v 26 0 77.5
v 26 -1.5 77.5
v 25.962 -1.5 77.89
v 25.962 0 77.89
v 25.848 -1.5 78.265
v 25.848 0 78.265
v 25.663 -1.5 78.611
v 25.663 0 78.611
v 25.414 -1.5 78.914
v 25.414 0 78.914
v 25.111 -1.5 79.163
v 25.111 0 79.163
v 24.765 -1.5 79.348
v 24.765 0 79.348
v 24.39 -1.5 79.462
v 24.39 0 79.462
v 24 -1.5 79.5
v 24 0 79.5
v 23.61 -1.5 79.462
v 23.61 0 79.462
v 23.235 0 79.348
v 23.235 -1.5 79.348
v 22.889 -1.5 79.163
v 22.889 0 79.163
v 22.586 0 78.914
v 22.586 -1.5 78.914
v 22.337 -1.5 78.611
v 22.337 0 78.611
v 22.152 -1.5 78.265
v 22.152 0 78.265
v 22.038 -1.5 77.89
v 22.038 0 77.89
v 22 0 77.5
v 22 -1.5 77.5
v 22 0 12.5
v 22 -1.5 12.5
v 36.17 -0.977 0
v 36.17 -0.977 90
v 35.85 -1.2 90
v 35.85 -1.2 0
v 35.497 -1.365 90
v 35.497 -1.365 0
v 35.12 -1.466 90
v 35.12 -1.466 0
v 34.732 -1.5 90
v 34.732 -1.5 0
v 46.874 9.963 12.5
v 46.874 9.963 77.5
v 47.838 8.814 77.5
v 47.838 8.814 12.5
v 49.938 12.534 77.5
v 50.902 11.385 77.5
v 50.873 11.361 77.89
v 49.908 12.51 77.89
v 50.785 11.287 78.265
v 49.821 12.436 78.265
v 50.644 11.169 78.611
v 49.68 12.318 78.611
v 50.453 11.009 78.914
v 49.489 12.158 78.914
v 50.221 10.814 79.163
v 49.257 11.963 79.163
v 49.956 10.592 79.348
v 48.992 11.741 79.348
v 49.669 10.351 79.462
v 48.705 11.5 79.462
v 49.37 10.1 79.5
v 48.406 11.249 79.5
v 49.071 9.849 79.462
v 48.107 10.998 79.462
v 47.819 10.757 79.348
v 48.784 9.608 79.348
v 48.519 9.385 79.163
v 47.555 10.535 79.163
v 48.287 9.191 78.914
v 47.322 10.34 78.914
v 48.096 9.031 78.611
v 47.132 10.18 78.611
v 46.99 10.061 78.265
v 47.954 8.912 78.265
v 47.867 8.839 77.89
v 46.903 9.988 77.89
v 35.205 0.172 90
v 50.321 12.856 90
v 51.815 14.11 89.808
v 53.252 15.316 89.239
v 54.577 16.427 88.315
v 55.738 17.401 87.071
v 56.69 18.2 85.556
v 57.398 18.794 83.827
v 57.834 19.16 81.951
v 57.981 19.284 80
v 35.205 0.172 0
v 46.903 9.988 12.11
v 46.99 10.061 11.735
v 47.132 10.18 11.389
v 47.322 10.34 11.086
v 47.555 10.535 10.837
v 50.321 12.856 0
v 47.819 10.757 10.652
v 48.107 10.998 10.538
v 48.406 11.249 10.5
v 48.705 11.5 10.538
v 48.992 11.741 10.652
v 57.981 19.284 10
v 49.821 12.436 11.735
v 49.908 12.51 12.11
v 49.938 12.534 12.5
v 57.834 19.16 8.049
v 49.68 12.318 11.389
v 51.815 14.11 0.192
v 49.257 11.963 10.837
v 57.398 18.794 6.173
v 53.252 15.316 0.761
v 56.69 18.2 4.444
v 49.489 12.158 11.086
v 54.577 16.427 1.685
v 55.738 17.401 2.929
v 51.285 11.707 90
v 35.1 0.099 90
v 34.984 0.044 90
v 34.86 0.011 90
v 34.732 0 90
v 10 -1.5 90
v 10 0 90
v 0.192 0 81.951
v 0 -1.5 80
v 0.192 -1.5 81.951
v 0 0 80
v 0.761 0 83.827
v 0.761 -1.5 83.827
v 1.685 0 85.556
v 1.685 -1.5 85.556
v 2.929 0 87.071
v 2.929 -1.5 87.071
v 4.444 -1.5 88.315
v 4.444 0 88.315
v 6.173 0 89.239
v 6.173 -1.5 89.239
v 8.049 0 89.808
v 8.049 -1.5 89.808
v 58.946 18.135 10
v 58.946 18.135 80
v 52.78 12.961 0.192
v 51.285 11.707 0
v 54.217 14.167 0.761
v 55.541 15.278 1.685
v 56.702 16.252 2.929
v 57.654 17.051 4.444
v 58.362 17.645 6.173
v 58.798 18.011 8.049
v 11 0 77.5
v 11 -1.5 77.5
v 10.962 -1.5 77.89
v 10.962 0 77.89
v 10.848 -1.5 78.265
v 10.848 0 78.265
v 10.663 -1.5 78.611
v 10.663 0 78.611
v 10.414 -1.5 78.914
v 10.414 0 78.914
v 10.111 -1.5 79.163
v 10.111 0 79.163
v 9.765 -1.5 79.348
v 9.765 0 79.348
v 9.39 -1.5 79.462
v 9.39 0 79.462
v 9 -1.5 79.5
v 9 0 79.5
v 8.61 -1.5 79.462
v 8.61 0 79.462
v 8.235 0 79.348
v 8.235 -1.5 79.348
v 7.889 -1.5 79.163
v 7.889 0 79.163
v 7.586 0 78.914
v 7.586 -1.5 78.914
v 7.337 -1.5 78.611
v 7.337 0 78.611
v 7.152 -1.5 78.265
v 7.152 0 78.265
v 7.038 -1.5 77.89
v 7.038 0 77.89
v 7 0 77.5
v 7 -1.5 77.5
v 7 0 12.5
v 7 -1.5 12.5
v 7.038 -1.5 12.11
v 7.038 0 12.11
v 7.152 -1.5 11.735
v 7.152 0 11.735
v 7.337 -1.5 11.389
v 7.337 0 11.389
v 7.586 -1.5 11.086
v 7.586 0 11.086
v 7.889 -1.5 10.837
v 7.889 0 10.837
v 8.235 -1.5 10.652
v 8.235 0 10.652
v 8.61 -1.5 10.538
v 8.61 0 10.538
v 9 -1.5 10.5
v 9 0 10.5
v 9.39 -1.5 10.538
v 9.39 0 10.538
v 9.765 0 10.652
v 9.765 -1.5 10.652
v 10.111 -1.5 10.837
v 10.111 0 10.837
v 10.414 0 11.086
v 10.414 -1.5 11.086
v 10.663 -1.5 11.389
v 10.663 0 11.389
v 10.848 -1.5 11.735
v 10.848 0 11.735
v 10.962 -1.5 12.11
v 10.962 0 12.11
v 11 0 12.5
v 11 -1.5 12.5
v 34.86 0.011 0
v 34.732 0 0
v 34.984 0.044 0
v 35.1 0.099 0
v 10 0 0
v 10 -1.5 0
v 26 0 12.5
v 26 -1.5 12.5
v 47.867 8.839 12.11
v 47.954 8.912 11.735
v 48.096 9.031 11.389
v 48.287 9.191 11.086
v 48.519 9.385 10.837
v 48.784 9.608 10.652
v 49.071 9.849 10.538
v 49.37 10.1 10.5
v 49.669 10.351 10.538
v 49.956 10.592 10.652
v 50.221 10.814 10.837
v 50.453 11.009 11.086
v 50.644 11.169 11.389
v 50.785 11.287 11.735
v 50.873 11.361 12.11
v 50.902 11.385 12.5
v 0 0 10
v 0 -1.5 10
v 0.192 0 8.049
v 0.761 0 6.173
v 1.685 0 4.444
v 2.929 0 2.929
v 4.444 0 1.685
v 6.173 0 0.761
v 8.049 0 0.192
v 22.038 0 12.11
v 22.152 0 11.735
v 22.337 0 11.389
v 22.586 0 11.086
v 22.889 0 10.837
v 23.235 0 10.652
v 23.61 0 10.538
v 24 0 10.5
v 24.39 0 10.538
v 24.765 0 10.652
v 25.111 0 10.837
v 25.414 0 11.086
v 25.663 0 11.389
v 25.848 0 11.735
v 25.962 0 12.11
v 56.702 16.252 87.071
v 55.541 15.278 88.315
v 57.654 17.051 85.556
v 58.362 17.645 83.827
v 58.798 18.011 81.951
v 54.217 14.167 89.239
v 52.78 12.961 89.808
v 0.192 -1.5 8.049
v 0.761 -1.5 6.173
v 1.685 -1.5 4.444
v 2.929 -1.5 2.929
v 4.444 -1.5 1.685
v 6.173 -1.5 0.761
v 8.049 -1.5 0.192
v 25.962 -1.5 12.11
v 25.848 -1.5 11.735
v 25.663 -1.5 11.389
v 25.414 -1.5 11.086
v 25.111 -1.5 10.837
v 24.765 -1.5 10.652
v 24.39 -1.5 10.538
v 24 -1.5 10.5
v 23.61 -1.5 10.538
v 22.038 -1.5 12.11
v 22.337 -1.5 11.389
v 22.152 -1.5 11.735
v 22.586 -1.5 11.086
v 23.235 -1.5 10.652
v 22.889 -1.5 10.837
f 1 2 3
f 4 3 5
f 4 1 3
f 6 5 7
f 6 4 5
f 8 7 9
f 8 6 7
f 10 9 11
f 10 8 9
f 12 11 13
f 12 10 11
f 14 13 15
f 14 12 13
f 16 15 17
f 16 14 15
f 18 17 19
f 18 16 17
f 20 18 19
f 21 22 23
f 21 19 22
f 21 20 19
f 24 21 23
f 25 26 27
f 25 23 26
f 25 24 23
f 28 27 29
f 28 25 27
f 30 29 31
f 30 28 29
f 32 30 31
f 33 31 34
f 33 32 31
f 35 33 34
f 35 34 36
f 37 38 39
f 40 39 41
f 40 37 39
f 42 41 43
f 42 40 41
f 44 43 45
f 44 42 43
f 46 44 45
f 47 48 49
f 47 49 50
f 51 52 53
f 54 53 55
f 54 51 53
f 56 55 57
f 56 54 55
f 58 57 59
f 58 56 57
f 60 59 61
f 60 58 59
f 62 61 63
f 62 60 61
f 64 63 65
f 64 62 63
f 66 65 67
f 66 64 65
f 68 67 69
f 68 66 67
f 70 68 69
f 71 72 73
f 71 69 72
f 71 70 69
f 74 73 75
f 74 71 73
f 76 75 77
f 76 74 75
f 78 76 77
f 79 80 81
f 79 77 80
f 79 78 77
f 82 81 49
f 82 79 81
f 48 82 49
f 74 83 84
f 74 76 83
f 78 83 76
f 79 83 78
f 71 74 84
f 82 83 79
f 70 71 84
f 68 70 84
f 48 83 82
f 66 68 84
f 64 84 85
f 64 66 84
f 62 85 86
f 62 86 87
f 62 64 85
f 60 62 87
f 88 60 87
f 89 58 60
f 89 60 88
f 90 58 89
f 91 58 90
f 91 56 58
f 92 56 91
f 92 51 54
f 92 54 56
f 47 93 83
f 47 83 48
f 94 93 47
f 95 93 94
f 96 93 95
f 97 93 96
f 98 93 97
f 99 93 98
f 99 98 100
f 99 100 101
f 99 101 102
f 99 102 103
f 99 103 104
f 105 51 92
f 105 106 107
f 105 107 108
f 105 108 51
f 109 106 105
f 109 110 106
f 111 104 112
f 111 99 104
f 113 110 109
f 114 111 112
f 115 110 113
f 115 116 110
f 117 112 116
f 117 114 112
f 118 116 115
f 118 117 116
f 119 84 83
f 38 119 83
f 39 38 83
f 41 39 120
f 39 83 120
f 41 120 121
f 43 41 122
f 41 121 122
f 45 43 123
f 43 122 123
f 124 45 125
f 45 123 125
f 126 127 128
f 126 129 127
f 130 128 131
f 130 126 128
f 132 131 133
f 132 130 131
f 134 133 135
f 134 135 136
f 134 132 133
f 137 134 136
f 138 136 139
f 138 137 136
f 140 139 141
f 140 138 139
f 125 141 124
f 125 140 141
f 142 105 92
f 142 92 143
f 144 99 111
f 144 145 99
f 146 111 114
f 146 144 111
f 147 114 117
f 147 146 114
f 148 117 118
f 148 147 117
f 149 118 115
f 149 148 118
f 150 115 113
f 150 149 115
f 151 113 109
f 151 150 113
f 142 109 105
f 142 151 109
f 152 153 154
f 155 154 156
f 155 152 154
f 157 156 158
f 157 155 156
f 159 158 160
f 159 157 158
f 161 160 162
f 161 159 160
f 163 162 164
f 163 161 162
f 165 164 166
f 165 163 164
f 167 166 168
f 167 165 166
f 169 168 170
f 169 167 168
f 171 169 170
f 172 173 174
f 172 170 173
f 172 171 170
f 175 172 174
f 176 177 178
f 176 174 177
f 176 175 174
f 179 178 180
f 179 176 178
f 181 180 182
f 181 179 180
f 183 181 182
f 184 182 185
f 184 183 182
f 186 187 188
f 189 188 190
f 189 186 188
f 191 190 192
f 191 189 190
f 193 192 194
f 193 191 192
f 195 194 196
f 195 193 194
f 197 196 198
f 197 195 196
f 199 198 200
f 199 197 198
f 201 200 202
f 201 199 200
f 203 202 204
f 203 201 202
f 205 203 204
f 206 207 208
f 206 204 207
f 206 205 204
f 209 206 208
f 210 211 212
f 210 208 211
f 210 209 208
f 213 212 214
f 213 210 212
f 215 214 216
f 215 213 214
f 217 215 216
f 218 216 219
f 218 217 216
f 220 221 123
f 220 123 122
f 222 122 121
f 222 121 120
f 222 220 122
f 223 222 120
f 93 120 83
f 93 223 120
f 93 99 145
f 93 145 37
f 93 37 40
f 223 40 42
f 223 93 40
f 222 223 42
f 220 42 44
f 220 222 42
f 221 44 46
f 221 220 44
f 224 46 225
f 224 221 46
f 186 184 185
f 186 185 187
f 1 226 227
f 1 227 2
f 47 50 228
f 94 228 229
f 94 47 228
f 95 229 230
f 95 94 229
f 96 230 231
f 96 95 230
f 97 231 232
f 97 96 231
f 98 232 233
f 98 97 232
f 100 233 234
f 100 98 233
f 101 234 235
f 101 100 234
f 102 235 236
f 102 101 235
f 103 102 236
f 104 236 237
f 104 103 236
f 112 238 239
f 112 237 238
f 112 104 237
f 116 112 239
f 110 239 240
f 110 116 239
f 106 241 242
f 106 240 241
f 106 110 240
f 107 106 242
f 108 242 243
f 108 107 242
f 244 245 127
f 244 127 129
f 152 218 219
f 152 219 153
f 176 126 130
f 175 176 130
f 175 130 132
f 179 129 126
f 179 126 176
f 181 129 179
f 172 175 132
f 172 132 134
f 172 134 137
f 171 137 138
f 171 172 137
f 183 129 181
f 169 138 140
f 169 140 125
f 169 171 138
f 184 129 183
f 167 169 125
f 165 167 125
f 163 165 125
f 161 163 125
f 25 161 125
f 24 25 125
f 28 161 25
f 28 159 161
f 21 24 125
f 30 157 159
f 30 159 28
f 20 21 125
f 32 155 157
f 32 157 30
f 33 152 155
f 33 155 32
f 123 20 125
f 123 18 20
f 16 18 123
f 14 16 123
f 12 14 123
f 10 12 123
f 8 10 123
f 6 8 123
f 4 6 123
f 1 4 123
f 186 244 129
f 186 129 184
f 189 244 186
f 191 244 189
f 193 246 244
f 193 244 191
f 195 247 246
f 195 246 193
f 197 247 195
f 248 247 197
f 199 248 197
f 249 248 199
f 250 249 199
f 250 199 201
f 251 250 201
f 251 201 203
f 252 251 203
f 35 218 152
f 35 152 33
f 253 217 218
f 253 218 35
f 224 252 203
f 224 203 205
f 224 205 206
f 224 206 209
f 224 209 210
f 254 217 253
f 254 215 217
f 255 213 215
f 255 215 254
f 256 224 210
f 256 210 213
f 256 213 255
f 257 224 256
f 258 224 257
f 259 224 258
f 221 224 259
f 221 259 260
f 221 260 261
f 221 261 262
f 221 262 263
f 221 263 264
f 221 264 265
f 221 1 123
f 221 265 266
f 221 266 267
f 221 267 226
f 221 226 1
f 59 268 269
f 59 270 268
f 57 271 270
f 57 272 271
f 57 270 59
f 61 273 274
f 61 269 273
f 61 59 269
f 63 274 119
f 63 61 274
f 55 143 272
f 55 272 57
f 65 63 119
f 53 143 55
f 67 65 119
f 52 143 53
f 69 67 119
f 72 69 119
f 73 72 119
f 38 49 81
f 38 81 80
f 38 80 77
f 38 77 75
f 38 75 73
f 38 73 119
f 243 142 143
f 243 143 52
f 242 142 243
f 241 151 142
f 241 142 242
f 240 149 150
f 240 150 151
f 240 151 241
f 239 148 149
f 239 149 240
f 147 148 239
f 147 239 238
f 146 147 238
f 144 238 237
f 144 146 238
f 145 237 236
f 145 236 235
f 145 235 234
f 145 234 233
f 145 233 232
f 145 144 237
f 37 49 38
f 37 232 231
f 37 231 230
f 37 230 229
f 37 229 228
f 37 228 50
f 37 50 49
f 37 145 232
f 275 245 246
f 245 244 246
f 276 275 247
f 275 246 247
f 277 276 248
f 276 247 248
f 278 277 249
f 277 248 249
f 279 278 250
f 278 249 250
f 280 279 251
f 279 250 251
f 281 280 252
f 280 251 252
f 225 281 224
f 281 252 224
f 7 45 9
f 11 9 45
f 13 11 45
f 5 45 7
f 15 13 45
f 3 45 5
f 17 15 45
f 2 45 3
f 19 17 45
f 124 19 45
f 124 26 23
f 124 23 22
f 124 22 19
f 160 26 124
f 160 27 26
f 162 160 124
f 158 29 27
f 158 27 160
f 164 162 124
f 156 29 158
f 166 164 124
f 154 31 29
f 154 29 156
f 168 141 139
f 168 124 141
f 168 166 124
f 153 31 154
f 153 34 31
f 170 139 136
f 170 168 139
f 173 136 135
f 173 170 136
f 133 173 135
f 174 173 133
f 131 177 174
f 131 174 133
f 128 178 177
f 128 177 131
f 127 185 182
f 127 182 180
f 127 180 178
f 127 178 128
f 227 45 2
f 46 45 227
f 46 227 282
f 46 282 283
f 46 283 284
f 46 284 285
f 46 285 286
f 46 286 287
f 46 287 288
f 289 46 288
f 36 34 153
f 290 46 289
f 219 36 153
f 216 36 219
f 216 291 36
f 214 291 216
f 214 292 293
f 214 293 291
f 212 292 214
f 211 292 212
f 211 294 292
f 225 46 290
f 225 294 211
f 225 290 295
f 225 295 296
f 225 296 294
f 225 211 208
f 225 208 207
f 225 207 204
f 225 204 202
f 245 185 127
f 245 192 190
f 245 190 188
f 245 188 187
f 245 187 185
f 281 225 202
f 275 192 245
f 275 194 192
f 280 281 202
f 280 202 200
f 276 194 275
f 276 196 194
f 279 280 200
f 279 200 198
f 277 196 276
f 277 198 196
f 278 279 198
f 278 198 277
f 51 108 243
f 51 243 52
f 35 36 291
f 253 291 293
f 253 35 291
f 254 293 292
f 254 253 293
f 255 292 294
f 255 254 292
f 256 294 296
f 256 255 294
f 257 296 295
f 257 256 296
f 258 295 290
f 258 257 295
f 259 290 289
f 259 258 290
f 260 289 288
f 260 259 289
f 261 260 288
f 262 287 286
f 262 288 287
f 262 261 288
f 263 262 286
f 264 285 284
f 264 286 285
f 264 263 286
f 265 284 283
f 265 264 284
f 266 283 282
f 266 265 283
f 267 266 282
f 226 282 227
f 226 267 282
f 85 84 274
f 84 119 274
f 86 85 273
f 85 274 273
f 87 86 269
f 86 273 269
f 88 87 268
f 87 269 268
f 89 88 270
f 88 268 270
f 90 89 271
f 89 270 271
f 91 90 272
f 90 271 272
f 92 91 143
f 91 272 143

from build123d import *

# Parameters (mm, degrees)
SM_BASE_FLANGE_1_DEPTH = 90
CUT_EXTRUDE_1_DEPTH    = 10
CUT_EXTRUDE_2_DEPTH    = 10
FILLET_1_R             = 10


# Sheet-metal steps are written as plain solids
with BuildPart() as part:
    # Sketch 1 → 基体-法兰1 (new body)
    with BuildSketch(Plane.XY):
        with BuildLine():
            Line((0, 0), (34.731899525, 0))
            ThreePointArc((34.731899525, 0), (34.983831563, 0.044422416), (35.205376879, 0.172331663))
            Line((35.205376879, 0.172331663), (57.981333294, 19.283628291))
            Line((57.981333294, 19.283628291), (58.945514708, 18.134561626))
            Line((58.945514708, 18.134561626), (36.169558293, -0.976735001))
            ThreePointArc((36.169558293, -0.976735001), (35.496861778, -1.365116516), (34.731899525, -1.5))
            Line((34.731899525, -1.5), (0, -1.5))
            Line((0, -1.5), (0, 0))
        make_face()
    extrude(amount=SM_BASE_FLANGE_1_DEPTH)

    # 草图6 → 切除-拉伸1 (cut)
    with BuildSketch(Plane(origin=(0, 0, 0), x_dir=(1, 0, 0), z_dir=(0, 1, 0))):
        with BuildLine():
            Line((11, -12.5), (11, -77.5))
            ThreePointArc((11, -77.5), (9, -79.5), (7, -77.5))
            Line((7, -77.5), (7, -12.5))
            ThreePointArc((7, -12.5), (9, -10.5), (11, -12.5))
        make_face()
        with BuildLine():
            Line((26, -12.5), (26, -77.5))
            ThreePointArc((26, -77.5), (24, -79.5), (22, -77.5))
            Line((22, -77.5), (22, -12.5))
            ThreePointArc((22, -12.5), (24, -10.5), (26, -12.5))
        make_face()
    extrude(amount=-CUT_EXTRUDE_1_DEPTH, mode=Mode.SUBTRACT)

    # 草图7 → 切除-拉伸2 (cut)
    with BuildSketch(Plane(origin=(14.461156891, -17.234135678, 0), x_dir=(0, 0, 1), z_dir=(-0.6427876096865403, 0.7660444431189772, 0))):
        with BuildLine():
            Line((12.5, 46.311555509), (77.5, 46.311555509))
            ThreePointArc((77.5, 46.311555509), (79.5, 44.311555509), (77.5, 42.311555509))
            Line((77.5, 42.311555509), (12.5, 42.311555509))
            ThreePointArc((12.5, 42.311555509), (10.5, 44.311555509), (12.5, 46.311555509))
        make_face()
    extrude(amount=-CUT_EXTRUDE_2_DEPTH, mode=Mode.SUBTRACT)

    # 圆角1
    fillet_1_edges = [part.edges().sort_by_distance(p)[0] for p in [
        (0, -0.75, 90),
        (0, -0.75, 0),
        (58.463424001, 18.709094958, 90),
        (58.463424001, 18.709094958, 0),
    ]]
    fillet(fillet_1_edges, radius=FILLET_1_R)


solid = part.part
